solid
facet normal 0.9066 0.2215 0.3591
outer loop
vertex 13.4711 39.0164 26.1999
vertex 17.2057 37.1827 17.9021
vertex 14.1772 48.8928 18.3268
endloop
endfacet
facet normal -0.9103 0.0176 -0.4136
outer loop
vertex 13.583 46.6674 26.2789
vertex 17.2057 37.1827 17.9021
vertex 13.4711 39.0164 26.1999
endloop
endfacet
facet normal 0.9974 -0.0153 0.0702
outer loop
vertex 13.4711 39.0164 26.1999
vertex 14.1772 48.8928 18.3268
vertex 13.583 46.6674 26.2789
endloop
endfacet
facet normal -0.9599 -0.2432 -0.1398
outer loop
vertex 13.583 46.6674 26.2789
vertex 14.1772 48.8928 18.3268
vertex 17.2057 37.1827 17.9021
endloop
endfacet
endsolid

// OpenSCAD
// Auto-generated auxetic polyhedron
points = [
    [14.177168, 48.892825, 18.326762],
    [17.205652, 37.182740, 17.902098],
    [13.471096, 39.016355, 26.199928],
    [13.583015, 46.667351, 26.278936],
];

faces = [
    [0, 1, 2],
    [2, 1, 3],
    [3, 0, 2],
    [1, 0, 3],
];

polyhedron(points = points, faces = faces);
